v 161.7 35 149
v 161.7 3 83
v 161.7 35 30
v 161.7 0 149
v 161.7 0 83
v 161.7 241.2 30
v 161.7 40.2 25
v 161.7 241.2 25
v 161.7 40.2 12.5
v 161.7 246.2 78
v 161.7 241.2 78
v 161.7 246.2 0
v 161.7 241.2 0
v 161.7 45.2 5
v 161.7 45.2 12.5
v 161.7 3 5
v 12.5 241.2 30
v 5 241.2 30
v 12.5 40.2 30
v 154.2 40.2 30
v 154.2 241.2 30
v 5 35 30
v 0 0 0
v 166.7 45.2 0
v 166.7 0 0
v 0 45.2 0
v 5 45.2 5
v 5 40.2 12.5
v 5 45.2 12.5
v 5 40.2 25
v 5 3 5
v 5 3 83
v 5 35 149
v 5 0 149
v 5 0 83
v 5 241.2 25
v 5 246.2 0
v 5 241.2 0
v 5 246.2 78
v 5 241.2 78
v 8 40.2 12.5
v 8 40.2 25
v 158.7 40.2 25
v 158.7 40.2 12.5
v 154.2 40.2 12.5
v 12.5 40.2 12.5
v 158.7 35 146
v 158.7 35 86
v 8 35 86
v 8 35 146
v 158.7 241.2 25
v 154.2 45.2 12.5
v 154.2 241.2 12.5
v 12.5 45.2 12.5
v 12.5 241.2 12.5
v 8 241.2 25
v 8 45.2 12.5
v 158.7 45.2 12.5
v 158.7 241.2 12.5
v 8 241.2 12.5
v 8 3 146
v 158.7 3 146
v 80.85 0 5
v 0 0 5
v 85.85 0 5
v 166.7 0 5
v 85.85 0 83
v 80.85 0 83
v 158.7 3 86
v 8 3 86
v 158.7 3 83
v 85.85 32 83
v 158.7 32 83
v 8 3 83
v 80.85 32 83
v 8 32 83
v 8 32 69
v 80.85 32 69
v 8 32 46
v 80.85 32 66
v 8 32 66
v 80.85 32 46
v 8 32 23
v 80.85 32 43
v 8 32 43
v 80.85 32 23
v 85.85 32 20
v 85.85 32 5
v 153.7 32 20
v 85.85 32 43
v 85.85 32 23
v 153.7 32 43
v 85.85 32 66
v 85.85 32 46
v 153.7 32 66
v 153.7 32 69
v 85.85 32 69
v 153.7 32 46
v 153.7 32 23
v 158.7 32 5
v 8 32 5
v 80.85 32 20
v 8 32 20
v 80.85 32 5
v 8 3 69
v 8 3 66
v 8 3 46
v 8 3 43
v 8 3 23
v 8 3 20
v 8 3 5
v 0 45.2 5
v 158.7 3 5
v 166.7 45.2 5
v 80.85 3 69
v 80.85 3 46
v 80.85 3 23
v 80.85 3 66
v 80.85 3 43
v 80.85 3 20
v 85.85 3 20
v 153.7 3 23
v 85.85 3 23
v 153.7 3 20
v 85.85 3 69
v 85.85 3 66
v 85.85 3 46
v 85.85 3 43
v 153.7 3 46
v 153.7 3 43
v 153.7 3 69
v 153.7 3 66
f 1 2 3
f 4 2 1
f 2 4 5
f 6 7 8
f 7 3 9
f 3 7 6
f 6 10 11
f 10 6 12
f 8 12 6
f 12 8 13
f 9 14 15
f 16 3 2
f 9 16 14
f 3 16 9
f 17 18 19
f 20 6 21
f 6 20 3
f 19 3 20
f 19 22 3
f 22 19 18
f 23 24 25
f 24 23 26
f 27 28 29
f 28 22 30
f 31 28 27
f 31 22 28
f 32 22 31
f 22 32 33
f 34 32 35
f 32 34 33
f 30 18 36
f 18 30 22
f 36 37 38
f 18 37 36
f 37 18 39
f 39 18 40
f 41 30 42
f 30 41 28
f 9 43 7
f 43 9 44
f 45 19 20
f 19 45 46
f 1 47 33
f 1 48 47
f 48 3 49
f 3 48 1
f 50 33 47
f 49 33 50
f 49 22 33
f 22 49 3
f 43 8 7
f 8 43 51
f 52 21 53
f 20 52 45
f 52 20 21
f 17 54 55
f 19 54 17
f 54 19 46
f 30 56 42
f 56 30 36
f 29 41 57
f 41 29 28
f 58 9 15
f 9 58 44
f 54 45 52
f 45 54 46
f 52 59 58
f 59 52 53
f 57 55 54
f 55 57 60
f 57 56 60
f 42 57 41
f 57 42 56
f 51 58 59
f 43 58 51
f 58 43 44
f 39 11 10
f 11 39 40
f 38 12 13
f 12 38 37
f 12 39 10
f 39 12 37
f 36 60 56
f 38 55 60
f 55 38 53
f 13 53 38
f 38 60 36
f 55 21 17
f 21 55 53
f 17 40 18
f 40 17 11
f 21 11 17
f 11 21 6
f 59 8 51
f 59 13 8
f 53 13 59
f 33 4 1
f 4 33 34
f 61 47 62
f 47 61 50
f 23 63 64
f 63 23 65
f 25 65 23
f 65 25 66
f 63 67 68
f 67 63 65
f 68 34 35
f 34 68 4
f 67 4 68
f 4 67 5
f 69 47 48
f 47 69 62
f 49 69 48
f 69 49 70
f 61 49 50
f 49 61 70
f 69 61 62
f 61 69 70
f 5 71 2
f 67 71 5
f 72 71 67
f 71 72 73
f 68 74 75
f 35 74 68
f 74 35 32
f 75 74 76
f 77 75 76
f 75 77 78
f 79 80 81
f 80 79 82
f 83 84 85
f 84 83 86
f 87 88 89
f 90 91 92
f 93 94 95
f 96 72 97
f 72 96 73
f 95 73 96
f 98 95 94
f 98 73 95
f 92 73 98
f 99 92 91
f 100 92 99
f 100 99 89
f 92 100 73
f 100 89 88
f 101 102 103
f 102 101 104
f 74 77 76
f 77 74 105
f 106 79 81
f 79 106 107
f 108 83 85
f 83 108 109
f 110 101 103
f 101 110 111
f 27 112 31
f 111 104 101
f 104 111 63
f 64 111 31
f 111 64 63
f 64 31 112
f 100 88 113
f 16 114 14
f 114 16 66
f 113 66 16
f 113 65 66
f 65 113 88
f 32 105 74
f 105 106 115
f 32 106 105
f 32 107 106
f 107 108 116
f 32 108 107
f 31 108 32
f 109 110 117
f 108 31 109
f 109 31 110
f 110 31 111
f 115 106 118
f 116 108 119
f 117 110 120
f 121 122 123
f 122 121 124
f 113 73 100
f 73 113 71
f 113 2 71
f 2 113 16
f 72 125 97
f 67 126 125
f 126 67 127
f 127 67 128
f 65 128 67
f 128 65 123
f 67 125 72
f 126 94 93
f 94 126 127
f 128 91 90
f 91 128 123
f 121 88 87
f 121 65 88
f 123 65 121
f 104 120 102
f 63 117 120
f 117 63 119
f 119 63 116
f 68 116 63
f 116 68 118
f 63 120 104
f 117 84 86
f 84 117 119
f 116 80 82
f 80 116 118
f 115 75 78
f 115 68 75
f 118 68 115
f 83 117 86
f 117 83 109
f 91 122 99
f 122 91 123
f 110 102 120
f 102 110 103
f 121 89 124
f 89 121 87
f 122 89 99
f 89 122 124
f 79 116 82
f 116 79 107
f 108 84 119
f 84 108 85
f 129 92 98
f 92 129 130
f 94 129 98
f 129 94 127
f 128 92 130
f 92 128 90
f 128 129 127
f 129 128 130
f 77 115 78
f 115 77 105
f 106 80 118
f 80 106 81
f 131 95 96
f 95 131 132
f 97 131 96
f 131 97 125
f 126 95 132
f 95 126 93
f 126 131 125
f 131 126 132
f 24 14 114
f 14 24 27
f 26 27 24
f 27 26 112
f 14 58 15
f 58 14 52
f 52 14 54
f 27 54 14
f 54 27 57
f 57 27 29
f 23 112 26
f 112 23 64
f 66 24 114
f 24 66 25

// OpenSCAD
// Bed Variables
BedWidth = 156.7;
FooterHeight = 30;
BedBoardThickness = 5;
ThickerBedBoard = BedBoardThickness + 0.2;
InnerSideBeamHeight = 12.5;
InnerSideBeamThickness = 4.5;
UpperSideBeamWidth = 7.5;
SideBeamLength = 201.2;
HeadBoardHeight = 78;
// Shelf Variables
CabinetDepth = 35;
ThinBoard = 3;
ThickBoard = 5;
ShelfSpacing = 20;
TvAreaHeight = 60;
ShelfTotalHeight = 80;
ShelfWidth = (BedWidth-(ThinBoard*2)-ThickBoard)/2;
SupportHeight = FooterHeight-BedBoardThickness-InnerSideBeamHeight;

module bed_frame() {
	union() {
		translate([0,0,0]) {
			cube([BedWidth,ThickerBedBoard,FooterHeight]);
		}
		translate([BedWidth-UpperSideBeamWidth,ThickerBedBoard,FooterHeight-BedBoardThickness]) {
			cube([UpperSideBeamWidth,SideBeamLength,BedBoardThickness]);
		}
		translate([0,ThickerBedBoard,FooterHeight-BedBoardThickness]) {
			cube([UpperSideBeamWidth,SideBeamLength,BedBoardThickness]);
		}
		translate([UpperSideBeamWidth-InnerSideBeamThickness,ThickerBedBoard,(FooterHeight-BedBoardThickness)/2]) {
			cube([InnerSideBeamThickness,SideBeamLength,InnerSideBeamHeight]);
		}
		translate([BedWidth-UpperSideBeamWidth,ThickerBedBoard,(FooterHeight-BedBoardThickness)/2]) {
			cube([InnerSideBeamThickness,SideBeamLength,InnerSideBeamHeight]);
		}
		translate([0,SideBeamLength+BedBoardThickness,0]) {
			cube([BedWidth,BedBoardThickness,HeadBoardHeight]);
		}
	}
}

module tv_stand() {
	union() {
		// Top Board
		translate([0,0,TvAreaHeight+ShelfTotalHeight+(ThinBoard*2)]) {
			cube([BedWidth,CabinetDepth,ThinBoard]);
		}
		// TV Backing
		translate([ThinBoard,0,ShelfTotalHeight+(ThinBoard*2)]) {
			cube([BedWidth-(ThinBoard*2),ThinBoard,TvAreaHeight]);
		}
		// TV Right Panel
		translate([0,0,ShelfTotalHeight+(ThinBoard*2)]) {
			cube([ThinBoard,CabinetDepth,TvAreaHeight]);
		}
		// TV Left Panel
		translate([BedWidth-ThinBoard,0,ShelfTotalHeight+(ThinBoard*2)]) {
			cube([ThinBoard,CabinetDepth,TvAreaHeight]);
		}
		// TV Base Board
		translate([0,0,ShelfTotalHeight+ThinBoard]) {
			cube([BedWidth,CabinetDepth,ThinBoard]);
		}
		// Foot Board
		translate([0,CabinetDepth-ThinBoard,ThinBoard]) {
			cube([BedWidth,ThinBoard,ShelfTotalHeight]);
		}
		// Left Panel
		translate([0,ThinBoard,ThickBoard]) {
			cube([ThinBoard,CabinetDepth-(ThinBoard*2),ShelfTotalHeight]);
		}
		// Right Panel
		translate([BedWidth-ThinBoard,ThinBoard,ThickBoard]) {
			cube([ThinBoard,CabinetDepth-(ThinBoard*2),ShelfTotalHeight]);
		}
		// Mid Divider
		translate([(BedWidth-ThickBoard)/2,0,ThickBoard]) {
			cube([ThickBoard,CabinetDepth-ThinBoard,ShelfTotalHeight]);
		}
		// Shelves
		translate([ThinBoard,ThinBoard,ShelfSpacing]) {
			cube([ShelfWidth,CabinetDepth-(ThinBoard*2),ThinBoard]);
		}
		translate([ShelfWidth+ThinBoard,ThinBoard,ShelfSpacing]) {
			cube([ShelfWidth,CabinetDepth-(ThinBoard*2),ThinBoard]);
		}
		translate([ThinBoard,ThinBoard,(ShelfSpacing*2)+(ThinBoard)]) {
			cube([ShelfWidth,CabinetDepth-(ThinBoard*2),ThinBoard]);
		}
		translate([ShelfWidth+ThinBoard,ThinBoard,(ShelfSpacing*2)+(ThinBoard)]) {
			cube([ShelfWidth,CabinetDepth-(ThinBoard*2),ThinBoard]);
		}
		translate([ThinBoard,ThinBoard,(ShelfSpacing*3)+(ThinBoard*2)]) {
			cube([ShelfWidth,CabinetDepth-(ThinBoard*2),ThinBoard]);
		}
		translate([ShelfWidth+ThinBoard,ThinBoard,(ShelfSpacing*3)+(ThinBoard*2)]) {
			cube([ShelfWidth,CabinetDepth-(ThinBoard*2),ThinBoard]);
		}
		//Bottom Board
		translate([0,0,0]) {
			cube([BedWidth,CabinetDepth,ThickBoard]);
		}
	}
}

module tv_stand_support() {
	union() {
		translate([ThickBoard,CabinetDepth+ThickerBedBoard,0]) {
			cube([BedWidth,ThickBoard,SupportHeight]);
		}
		translate([0,0,0]) {
			cube([ThickBoard,CabinetDepth+ThickerBedBoard+ThickBoard,ThickBoard]);
		}
		translate([BedWidth+ThickBoard,0,0]) {
			cube([ThickBoard,CabinetDepth+ThickerBedBoard+ThickBoard,ThickBoard]);
		}
	}
}

translate([5,35,0]) {
	color("Brown", 0.6) {
		bed_frame();
	}
}
translate([5,0,0]) {
	color("Green", 0.4) {
		tv_stand();
	}
}
translate([0,0,0]) {
	color("Blue", 0.4) {
		tv_stand_support();
	}
}
